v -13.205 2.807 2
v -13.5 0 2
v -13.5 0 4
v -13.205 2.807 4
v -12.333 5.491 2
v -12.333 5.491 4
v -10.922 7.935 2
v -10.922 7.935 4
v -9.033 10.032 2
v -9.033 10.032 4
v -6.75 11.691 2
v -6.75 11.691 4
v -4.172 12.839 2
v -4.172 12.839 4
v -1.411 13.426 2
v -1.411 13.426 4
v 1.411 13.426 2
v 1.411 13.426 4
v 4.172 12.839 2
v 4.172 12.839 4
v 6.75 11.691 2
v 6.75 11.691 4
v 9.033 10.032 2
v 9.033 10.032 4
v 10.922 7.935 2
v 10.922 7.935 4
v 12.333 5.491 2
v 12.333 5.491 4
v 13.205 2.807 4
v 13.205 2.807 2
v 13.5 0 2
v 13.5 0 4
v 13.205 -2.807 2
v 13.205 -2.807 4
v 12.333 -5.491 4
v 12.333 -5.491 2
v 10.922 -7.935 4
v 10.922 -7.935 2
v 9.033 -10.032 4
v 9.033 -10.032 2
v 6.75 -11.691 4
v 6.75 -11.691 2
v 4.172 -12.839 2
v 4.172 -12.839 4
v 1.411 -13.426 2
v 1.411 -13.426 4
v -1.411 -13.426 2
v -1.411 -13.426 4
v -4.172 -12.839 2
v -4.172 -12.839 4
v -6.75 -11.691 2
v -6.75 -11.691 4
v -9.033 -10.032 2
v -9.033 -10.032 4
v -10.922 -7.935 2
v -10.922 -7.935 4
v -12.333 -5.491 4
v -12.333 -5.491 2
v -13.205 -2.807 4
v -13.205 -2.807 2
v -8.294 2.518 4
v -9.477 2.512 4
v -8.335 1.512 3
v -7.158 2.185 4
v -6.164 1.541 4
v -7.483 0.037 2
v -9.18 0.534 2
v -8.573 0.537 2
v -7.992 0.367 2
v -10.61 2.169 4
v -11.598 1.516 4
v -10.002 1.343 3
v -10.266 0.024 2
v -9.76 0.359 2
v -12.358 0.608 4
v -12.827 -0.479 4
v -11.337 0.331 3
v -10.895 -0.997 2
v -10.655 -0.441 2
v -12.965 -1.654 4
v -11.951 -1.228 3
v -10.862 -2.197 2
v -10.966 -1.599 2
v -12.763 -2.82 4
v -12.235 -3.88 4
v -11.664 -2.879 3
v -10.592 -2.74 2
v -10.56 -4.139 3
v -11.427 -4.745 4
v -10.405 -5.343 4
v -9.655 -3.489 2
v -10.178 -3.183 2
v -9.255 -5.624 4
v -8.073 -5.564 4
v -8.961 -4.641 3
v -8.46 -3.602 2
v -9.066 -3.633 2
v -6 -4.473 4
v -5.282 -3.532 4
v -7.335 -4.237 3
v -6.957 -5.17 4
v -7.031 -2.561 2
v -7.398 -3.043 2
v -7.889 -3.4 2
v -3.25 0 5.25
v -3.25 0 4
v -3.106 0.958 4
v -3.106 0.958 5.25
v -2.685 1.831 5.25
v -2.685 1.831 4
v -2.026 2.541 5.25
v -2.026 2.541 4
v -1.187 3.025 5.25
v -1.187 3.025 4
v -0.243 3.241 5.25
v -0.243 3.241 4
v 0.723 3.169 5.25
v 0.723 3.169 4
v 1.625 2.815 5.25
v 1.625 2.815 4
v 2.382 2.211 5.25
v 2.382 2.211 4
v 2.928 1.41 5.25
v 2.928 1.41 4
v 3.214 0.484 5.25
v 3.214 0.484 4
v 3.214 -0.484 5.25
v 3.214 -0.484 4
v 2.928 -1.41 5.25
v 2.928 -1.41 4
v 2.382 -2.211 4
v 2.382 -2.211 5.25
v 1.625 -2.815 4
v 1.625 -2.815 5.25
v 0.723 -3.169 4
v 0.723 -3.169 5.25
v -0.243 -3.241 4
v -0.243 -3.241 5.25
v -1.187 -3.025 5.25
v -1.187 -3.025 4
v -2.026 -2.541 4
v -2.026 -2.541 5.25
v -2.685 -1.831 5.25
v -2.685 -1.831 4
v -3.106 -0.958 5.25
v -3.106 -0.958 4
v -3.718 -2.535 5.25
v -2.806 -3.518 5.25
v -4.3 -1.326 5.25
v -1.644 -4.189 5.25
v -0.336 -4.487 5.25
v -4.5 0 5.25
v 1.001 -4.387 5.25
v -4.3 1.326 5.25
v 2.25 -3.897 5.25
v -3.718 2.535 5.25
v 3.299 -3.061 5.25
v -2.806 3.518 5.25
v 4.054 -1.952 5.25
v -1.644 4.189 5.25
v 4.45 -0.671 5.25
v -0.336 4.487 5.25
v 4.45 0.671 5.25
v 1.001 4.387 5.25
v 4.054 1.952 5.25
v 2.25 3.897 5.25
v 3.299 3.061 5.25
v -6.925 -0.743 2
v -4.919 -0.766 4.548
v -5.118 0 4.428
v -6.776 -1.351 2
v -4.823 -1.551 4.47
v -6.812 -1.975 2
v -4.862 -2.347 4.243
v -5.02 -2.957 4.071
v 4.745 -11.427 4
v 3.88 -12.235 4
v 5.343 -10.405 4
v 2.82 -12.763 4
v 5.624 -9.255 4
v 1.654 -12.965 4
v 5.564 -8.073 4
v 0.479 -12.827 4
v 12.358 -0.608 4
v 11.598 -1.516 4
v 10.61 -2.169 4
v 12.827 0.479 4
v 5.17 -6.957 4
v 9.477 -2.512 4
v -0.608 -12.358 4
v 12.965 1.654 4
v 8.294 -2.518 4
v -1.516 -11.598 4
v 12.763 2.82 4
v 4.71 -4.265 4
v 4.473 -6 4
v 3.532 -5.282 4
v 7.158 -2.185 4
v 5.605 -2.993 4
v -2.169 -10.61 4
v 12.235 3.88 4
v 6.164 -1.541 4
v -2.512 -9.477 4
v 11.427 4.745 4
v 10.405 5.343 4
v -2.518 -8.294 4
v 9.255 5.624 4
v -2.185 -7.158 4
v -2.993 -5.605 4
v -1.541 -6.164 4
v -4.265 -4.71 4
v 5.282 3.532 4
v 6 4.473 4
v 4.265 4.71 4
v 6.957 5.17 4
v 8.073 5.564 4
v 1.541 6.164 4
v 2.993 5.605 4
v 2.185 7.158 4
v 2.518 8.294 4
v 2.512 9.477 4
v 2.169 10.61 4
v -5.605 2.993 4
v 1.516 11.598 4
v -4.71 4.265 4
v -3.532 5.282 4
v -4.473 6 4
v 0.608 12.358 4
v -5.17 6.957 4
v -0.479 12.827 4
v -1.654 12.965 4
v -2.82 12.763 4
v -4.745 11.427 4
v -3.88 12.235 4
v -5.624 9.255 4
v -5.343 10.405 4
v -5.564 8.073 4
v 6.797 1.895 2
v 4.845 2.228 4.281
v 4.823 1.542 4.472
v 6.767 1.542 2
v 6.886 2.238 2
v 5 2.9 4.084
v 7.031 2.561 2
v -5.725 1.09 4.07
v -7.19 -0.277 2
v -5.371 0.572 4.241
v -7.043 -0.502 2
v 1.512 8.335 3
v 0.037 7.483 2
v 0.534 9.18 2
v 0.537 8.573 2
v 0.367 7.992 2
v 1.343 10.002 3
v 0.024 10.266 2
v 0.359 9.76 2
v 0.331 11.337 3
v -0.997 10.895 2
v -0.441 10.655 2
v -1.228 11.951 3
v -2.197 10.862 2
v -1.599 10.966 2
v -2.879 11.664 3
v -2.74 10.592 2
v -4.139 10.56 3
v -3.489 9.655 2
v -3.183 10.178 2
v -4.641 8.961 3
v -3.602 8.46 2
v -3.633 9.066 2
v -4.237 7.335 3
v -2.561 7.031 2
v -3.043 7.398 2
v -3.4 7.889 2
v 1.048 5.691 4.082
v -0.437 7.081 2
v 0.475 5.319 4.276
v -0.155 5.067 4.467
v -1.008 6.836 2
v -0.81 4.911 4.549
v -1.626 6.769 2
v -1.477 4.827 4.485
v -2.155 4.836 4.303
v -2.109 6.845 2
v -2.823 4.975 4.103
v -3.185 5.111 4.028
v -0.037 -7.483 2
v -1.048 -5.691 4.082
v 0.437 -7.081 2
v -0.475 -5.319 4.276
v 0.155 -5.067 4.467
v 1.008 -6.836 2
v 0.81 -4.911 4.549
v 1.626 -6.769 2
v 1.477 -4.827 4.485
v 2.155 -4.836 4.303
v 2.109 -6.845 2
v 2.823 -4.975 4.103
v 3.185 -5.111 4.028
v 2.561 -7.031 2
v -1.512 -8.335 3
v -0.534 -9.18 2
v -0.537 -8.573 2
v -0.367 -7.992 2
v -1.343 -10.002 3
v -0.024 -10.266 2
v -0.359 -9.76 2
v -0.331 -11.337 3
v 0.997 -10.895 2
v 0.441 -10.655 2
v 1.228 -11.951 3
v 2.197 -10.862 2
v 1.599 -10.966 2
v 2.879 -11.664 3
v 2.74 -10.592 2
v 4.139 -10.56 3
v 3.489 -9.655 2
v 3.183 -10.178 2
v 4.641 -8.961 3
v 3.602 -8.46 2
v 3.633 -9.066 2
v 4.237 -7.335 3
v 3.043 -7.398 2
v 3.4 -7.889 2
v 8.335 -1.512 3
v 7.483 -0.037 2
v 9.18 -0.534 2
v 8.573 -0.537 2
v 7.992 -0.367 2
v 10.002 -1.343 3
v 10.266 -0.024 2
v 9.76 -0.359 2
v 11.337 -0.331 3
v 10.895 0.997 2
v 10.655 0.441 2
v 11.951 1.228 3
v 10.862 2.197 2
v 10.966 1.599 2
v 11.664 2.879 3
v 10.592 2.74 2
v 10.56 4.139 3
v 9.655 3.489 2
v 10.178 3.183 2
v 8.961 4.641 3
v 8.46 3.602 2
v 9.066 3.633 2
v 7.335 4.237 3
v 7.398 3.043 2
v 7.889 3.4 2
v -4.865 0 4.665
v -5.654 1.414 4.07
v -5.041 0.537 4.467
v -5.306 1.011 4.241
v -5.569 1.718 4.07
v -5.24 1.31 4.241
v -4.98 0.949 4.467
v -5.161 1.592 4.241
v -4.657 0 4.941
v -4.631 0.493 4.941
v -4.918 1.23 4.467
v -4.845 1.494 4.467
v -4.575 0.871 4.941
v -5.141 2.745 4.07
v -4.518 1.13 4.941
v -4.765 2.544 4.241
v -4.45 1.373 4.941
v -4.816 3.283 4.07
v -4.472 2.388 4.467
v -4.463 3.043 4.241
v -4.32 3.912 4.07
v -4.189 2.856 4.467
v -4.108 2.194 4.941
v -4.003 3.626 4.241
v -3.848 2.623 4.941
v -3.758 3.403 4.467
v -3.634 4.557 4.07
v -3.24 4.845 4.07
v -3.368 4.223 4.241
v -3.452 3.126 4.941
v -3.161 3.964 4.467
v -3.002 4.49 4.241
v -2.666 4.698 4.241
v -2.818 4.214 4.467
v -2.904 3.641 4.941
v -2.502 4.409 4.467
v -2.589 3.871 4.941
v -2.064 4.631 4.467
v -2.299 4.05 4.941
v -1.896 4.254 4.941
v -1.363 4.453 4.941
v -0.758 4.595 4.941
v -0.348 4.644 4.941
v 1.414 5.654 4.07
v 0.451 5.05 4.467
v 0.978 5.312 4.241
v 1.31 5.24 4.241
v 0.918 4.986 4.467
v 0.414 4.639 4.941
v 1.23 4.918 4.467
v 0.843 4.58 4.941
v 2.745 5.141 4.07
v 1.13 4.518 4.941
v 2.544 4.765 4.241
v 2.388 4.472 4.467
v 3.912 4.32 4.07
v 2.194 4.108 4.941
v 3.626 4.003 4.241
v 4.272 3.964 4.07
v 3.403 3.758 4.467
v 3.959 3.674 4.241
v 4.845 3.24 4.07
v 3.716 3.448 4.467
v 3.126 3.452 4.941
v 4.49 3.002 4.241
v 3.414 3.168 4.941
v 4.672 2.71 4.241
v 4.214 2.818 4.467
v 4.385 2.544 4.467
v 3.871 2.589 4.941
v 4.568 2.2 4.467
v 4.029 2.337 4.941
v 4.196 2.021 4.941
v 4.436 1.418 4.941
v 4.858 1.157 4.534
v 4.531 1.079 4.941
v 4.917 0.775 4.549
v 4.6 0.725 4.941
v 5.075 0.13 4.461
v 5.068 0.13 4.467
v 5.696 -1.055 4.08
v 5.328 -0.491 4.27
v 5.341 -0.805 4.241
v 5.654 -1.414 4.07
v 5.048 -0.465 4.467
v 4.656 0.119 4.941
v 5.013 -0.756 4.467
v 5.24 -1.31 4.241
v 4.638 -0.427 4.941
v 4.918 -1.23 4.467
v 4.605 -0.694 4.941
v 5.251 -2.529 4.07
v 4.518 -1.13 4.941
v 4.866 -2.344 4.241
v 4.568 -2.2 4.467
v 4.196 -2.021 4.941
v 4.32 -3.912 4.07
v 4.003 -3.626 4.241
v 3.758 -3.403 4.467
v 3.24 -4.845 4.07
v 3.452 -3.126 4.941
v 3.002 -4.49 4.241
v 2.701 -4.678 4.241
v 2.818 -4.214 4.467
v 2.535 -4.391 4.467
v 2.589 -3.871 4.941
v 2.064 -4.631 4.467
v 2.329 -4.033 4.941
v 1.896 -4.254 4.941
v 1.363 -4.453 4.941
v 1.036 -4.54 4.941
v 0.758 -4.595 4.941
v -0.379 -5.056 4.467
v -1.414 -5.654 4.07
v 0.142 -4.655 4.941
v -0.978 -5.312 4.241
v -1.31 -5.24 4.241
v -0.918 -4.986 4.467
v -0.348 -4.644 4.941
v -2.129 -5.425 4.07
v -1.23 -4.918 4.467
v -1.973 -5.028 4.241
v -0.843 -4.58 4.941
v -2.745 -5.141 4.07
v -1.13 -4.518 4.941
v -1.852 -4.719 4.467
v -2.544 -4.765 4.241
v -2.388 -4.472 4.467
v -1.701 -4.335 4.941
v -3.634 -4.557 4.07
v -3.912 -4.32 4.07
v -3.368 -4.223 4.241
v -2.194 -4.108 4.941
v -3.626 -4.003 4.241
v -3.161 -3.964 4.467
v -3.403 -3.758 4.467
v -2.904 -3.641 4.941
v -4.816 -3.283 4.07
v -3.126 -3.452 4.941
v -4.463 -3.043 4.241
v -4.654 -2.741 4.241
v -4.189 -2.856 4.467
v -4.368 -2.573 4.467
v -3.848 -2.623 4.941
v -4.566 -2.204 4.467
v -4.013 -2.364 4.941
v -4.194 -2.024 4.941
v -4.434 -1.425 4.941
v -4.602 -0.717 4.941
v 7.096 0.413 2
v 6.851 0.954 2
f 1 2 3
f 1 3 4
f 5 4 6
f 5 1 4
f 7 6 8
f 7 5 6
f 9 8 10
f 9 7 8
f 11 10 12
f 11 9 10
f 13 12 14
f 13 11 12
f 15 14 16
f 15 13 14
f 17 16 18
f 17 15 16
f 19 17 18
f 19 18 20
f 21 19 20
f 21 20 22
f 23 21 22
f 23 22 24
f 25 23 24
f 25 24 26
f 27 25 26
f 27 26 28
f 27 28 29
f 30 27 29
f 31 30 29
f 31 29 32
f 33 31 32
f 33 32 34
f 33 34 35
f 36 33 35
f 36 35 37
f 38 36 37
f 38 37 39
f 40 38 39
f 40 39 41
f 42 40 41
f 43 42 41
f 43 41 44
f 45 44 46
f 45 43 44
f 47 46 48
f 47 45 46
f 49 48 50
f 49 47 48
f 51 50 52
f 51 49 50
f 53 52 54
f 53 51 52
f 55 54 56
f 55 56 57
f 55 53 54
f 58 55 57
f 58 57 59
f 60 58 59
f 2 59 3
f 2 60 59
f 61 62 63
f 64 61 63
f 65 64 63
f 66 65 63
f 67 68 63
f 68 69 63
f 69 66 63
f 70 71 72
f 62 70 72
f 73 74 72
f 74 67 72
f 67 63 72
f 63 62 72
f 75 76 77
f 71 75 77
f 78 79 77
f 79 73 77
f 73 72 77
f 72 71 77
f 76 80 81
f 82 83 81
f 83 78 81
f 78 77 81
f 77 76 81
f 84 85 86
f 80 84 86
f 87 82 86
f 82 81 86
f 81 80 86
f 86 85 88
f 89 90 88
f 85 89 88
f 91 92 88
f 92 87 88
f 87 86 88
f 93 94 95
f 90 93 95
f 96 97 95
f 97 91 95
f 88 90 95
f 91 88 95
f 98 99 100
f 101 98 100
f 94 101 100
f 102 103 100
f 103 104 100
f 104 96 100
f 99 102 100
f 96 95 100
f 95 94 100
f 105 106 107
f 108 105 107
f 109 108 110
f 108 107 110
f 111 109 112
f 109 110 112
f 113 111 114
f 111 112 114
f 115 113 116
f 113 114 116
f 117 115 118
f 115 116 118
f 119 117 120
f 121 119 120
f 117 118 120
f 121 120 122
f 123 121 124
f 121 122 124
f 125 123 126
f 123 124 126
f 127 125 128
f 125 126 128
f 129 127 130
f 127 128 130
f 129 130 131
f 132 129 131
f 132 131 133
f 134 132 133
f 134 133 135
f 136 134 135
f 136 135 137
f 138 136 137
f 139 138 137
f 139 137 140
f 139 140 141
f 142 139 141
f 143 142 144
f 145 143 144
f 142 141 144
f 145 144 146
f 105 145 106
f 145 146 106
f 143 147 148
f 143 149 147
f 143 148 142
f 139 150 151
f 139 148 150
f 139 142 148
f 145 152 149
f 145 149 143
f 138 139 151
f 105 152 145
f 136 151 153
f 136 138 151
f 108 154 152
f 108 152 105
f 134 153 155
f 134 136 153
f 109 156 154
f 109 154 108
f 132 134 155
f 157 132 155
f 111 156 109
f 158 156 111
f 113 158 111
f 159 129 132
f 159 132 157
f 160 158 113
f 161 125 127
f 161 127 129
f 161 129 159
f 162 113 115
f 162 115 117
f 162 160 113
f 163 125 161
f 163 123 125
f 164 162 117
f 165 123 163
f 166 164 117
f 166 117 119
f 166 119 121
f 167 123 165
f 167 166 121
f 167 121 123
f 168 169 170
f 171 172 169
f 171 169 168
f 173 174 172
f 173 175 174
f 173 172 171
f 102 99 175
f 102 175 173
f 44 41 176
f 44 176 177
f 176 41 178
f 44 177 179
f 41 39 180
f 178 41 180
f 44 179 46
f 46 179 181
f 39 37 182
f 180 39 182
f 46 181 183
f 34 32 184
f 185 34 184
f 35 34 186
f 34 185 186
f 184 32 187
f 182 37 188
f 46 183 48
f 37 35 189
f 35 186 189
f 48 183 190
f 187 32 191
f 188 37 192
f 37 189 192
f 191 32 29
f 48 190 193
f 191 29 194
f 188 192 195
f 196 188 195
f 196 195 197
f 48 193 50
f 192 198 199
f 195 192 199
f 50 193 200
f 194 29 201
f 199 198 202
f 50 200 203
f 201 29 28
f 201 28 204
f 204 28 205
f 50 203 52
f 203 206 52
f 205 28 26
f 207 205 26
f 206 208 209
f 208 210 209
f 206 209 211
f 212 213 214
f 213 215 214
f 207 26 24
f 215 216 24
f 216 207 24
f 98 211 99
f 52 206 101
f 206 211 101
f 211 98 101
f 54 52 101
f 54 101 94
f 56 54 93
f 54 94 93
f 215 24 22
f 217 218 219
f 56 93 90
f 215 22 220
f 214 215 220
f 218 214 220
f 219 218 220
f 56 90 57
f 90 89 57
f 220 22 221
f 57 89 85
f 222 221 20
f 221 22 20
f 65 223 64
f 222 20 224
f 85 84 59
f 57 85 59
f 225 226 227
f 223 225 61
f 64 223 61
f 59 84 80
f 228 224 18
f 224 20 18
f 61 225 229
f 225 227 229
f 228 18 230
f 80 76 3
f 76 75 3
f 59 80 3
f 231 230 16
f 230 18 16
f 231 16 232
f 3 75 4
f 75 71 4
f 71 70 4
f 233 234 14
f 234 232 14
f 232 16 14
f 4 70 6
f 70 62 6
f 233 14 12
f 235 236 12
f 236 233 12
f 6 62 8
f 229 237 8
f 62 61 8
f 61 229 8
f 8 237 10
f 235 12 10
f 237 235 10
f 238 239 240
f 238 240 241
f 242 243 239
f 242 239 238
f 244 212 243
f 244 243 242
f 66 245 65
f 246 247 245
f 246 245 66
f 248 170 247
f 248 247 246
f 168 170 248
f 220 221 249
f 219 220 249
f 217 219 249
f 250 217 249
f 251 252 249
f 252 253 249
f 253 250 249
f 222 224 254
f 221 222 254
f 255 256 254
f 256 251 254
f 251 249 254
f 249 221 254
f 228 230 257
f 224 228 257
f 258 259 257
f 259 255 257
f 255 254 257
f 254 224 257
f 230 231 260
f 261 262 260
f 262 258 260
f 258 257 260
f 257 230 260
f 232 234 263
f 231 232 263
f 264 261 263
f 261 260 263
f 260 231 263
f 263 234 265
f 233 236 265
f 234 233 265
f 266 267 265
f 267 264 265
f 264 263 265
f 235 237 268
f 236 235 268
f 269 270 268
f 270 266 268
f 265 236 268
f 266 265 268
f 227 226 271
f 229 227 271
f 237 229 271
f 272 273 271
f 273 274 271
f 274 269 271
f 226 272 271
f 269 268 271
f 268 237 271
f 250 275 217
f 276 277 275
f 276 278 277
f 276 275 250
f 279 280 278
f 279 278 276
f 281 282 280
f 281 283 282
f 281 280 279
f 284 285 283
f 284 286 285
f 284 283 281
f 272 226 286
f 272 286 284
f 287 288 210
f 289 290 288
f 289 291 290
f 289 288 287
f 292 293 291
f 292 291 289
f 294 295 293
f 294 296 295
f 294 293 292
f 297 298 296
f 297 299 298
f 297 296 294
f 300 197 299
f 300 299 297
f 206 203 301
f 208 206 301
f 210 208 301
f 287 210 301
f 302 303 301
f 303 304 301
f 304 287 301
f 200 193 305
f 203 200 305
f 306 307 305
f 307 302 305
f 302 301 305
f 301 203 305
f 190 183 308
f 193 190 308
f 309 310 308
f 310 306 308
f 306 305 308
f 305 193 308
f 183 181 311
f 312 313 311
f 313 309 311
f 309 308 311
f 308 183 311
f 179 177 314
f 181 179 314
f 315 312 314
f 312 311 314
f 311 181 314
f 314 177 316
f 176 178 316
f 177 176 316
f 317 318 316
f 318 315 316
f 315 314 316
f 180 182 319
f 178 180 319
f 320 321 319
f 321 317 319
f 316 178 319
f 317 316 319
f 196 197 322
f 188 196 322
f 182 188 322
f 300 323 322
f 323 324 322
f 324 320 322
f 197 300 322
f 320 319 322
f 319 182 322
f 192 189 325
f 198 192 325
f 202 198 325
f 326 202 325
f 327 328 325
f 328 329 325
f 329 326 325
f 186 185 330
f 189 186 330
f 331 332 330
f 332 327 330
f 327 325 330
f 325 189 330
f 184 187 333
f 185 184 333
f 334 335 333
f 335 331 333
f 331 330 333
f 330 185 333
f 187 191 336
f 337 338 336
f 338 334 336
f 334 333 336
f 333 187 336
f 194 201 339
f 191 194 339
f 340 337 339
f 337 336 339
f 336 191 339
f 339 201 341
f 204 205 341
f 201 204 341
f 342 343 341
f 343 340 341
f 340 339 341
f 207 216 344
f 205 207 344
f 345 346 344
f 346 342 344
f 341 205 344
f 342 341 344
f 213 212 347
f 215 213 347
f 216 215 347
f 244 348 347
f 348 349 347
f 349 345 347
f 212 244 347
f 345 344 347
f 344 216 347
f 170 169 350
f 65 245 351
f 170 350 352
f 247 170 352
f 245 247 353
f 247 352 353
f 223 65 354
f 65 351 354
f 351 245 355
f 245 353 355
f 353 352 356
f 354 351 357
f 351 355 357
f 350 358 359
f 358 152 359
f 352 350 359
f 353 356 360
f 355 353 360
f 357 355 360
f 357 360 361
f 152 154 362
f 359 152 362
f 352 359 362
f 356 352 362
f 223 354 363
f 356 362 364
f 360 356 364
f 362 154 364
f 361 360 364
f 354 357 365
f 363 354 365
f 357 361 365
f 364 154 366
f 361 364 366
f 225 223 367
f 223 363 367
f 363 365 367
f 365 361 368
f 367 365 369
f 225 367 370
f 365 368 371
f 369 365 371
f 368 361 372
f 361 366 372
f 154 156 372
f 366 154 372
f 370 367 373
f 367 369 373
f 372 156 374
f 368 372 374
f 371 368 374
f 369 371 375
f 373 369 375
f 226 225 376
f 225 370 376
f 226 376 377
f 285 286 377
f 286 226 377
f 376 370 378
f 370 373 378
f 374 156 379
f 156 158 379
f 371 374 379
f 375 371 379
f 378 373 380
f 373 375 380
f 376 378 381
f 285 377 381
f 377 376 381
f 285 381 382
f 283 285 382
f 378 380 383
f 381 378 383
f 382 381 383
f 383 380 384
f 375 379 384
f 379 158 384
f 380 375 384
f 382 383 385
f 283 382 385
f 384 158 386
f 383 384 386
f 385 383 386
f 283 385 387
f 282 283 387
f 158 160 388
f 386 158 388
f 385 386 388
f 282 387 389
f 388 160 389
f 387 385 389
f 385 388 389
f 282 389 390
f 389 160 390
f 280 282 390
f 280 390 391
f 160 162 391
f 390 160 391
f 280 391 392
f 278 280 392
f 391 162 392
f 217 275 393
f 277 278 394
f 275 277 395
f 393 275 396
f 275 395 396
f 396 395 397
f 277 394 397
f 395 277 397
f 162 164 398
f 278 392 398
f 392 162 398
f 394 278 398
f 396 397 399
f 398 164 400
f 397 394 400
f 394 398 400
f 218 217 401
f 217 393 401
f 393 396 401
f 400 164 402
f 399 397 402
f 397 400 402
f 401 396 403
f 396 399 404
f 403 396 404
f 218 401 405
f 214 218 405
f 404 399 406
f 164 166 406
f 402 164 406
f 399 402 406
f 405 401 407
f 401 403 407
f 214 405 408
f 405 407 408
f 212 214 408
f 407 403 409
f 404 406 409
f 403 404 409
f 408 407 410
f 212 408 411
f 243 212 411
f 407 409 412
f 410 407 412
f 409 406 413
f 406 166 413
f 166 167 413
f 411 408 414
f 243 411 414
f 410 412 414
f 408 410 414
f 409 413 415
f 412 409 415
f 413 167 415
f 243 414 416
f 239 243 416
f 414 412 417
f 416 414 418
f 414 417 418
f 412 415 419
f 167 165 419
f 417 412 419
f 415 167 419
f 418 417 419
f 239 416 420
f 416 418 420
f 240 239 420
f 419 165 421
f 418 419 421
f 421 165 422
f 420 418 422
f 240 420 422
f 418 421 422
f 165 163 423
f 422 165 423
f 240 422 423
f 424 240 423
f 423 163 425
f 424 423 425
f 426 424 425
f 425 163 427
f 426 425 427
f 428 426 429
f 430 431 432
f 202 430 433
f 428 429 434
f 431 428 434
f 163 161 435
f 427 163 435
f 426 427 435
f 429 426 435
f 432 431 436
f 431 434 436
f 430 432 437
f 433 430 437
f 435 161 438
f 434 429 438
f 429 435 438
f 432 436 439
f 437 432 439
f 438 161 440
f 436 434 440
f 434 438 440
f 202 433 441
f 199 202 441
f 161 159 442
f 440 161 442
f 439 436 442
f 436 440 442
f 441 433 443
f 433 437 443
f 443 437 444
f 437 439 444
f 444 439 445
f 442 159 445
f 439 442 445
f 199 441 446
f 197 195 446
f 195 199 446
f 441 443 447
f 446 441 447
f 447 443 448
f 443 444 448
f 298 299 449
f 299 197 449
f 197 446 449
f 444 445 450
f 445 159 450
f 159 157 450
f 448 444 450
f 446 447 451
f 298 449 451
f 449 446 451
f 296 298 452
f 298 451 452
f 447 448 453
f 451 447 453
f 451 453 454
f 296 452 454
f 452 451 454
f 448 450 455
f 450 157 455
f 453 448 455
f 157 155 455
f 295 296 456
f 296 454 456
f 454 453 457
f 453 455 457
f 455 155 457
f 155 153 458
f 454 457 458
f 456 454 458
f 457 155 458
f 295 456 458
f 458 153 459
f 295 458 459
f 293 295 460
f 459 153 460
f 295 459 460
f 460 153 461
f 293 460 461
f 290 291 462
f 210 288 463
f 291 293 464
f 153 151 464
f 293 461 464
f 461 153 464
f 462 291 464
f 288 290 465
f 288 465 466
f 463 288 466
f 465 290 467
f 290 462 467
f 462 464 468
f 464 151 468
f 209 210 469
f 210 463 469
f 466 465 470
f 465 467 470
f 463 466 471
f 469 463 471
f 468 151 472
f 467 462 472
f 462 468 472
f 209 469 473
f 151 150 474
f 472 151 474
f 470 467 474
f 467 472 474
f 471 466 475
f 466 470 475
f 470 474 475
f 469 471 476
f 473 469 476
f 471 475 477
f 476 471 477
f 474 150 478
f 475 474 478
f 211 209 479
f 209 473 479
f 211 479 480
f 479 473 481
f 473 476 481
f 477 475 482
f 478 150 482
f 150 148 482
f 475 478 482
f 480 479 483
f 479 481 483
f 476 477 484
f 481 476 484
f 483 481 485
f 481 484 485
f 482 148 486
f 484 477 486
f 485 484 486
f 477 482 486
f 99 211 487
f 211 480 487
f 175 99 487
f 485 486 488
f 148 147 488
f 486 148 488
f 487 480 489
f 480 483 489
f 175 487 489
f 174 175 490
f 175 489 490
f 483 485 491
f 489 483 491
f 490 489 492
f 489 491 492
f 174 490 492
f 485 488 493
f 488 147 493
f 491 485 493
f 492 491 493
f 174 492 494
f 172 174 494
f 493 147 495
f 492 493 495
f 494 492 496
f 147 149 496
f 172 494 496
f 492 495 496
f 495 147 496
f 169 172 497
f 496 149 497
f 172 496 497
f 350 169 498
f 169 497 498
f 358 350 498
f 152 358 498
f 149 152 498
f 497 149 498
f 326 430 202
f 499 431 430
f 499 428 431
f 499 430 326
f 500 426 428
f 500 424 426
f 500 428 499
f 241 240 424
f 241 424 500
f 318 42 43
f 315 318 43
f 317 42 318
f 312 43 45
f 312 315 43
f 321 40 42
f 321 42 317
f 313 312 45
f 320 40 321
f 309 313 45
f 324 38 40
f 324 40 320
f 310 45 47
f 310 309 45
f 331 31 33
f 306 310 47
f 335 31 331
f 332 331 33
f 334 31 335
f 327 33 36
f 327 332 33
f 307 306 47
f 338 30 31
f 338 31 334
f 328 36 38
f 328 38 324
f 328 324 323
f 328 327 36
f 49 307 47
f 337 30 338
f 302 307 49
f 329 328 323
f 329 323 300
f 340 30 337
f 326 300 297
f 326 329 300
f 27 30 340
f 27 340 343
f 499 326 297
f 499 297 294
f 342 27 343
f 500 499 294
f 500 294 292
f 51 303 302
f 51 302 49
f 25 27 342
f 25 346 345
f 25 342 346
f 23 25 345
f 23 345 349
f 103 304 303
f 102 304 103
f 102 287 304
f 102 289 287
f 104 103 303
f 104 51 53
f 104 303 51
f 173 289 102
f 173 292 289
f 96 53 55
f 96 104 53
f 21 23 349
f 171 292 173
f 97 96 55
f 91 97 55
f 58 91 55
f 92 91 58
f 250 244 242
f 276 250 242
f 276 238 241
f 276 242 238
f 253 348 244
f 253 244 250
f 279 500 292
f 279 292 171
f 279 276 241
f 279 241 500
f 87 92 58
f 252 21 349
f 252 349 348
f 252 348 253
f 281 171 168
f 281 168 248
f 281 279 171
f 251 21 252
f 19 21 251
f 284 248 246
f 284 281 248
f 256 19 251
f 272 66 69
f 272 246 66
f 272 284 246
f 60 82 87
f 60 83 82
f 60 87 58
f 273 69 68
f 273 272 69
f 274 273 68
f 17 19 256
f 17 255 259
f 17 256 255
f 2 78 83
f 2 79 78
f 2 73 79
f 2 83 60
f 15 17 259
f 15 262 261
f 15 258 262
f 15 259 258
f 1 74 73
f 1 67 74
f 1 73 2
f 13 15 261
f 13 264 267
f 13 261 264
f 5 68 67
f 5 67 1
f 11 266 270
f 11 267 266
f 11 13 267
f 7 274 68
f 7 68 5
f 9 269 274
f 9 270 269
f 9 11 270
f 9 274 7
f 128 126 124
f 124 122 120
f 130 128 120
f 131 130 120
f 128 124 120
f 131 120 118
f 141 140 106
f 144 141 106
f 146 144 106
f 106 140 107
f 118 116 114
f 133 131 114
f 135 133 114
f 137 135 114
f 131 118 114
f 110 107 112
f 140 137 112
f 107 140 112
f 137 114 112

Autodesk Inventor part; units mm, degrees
ref_plane "YZ Plane" through (0, 0, 0) normal (1, 0, 0) x (0, 1, 0)
ref_plane "XZ Plane" through (0, 0, 0) normal (0, 1, 0) x (-1, 0, 0)
ref_plane "XY Plane" through (0, 0, 0) normal (0, 0, 1) x (1, 0, 0)
sketch "Эскиз1" plane through (0, 0, 0) normal (0, 0, 1) x (1, 0, 0)
  circle A0 centre (0, 0) radius 3.25
  circle A1 centre (0, 0) radius 4.5
  dimension "d0" = 6.5
  dimension "d1" = 9
extrude "Выдавливание1" add sketch "Эскиз1" along normal blind 5.25
sketch "Эскиз2" plane through (0, 0, 0) normal (0, 0, -1) x (-1, 0, 0)
  circle A0 centre (0, 0) radius 5.5
  dimension "d4" = 11
loft "Лофт1" add profiles "Эскиз2" section 2 edges at (-4.5, 0, 5.25)
sketch "Эскиз4" plane through (0, 0, 0) normal (0, 0, -1) x (-1, 0, 0)
  circle A0 centre (0, 0) radius 3.25
  dimension "d10" = 6.5
extrude "Выдавливание2" cut sketch "Эскиз4" against normal through all
sketch "Эскиз5" plane through (0, 0, 0) normal (0, 0, -1) x (-1, 0, 0)
  circle A0 centre (-8.8669, 1.5421) radius 2.1 projected
  circle A1 centre (-1.5421, -8.8669) radius 2.1 projected
  circle A2 centre (1.5421, 8.8669) radius 2.1 projected
  circle A3 centre (8.8669, -1.5421) radius 2.1 projected
  circle A4 centre (0, 0) radius 13.5
  circle A5 centre (0, 0) radius 3.25 projected
  dimension "d13" = 27
extrude "Выдавливание3" add sketch "Эскиз5" against normal blind 4
fillet "Сопряжение1" radius 2 1 edges at (4.7381, 0, 4)
chamfer "Фаска1" distance 2 angle 45 4 edges at (0.5579, 8.8669, 4) (10.9669, 1.5421, 4) (-6.7669, -1.5421, 4) (3.6421, -8.8669, 4)
sketch "Эскиз6" plane through (0, 0, 0) normal (0, 0, -1) x (-1, 0, 0)
  circle A0 centre (0, 0) radius 13.5 projected
  circle A1 centre (8.8669, -1.5421) radius 2.1 projected
  circle A2 centre (1.5421, 8.8669) radius 2.1 projected
  circle A3 centre (-1.5421, -8.8669) radius 2.1 projected
  circle A4 centre (-8.8669, 1.5421) radius 2.1 projected
  circle A5 centre (0, 0) radius 3.25 projected
extrude "Выдавливание4" cut sketch "Эскиз6" against normal blind 2
sketch "Эскиз7" plane through (0, 0, 2) normal (0, 0, -1) x (-1, 0, 0)
  circle A0 centre (0, 0) radius 13.5 projected
  circle A1 centre (0, 0) radius 3.25 projected
  arc A2 (-7.0308, 2.5612) -> (-7.4827, -0.0371) centre (-8.8669, 1.5421) ccw projected
  arc A3 (-2.5612, -7.0308) -> (0.0371, -7.4827) centre (-1.5421, -8.8669) ccw projected
  arc A4 (2.5612, 7.0308) -> (-0.0371, 7.4827) centre (1.5421, 8.8669) ccw projected
  arc A5 (7.0308, -2.5612) -> (7.4827, 0.0371) centre (8.8669, -1.5421) ccw projected
extrude "Выдавливание5" add sketch "Эскиз7" against normal blind 2 contours A1
properties part number "втулка для крепл" material "Пластик ПЭТ"
